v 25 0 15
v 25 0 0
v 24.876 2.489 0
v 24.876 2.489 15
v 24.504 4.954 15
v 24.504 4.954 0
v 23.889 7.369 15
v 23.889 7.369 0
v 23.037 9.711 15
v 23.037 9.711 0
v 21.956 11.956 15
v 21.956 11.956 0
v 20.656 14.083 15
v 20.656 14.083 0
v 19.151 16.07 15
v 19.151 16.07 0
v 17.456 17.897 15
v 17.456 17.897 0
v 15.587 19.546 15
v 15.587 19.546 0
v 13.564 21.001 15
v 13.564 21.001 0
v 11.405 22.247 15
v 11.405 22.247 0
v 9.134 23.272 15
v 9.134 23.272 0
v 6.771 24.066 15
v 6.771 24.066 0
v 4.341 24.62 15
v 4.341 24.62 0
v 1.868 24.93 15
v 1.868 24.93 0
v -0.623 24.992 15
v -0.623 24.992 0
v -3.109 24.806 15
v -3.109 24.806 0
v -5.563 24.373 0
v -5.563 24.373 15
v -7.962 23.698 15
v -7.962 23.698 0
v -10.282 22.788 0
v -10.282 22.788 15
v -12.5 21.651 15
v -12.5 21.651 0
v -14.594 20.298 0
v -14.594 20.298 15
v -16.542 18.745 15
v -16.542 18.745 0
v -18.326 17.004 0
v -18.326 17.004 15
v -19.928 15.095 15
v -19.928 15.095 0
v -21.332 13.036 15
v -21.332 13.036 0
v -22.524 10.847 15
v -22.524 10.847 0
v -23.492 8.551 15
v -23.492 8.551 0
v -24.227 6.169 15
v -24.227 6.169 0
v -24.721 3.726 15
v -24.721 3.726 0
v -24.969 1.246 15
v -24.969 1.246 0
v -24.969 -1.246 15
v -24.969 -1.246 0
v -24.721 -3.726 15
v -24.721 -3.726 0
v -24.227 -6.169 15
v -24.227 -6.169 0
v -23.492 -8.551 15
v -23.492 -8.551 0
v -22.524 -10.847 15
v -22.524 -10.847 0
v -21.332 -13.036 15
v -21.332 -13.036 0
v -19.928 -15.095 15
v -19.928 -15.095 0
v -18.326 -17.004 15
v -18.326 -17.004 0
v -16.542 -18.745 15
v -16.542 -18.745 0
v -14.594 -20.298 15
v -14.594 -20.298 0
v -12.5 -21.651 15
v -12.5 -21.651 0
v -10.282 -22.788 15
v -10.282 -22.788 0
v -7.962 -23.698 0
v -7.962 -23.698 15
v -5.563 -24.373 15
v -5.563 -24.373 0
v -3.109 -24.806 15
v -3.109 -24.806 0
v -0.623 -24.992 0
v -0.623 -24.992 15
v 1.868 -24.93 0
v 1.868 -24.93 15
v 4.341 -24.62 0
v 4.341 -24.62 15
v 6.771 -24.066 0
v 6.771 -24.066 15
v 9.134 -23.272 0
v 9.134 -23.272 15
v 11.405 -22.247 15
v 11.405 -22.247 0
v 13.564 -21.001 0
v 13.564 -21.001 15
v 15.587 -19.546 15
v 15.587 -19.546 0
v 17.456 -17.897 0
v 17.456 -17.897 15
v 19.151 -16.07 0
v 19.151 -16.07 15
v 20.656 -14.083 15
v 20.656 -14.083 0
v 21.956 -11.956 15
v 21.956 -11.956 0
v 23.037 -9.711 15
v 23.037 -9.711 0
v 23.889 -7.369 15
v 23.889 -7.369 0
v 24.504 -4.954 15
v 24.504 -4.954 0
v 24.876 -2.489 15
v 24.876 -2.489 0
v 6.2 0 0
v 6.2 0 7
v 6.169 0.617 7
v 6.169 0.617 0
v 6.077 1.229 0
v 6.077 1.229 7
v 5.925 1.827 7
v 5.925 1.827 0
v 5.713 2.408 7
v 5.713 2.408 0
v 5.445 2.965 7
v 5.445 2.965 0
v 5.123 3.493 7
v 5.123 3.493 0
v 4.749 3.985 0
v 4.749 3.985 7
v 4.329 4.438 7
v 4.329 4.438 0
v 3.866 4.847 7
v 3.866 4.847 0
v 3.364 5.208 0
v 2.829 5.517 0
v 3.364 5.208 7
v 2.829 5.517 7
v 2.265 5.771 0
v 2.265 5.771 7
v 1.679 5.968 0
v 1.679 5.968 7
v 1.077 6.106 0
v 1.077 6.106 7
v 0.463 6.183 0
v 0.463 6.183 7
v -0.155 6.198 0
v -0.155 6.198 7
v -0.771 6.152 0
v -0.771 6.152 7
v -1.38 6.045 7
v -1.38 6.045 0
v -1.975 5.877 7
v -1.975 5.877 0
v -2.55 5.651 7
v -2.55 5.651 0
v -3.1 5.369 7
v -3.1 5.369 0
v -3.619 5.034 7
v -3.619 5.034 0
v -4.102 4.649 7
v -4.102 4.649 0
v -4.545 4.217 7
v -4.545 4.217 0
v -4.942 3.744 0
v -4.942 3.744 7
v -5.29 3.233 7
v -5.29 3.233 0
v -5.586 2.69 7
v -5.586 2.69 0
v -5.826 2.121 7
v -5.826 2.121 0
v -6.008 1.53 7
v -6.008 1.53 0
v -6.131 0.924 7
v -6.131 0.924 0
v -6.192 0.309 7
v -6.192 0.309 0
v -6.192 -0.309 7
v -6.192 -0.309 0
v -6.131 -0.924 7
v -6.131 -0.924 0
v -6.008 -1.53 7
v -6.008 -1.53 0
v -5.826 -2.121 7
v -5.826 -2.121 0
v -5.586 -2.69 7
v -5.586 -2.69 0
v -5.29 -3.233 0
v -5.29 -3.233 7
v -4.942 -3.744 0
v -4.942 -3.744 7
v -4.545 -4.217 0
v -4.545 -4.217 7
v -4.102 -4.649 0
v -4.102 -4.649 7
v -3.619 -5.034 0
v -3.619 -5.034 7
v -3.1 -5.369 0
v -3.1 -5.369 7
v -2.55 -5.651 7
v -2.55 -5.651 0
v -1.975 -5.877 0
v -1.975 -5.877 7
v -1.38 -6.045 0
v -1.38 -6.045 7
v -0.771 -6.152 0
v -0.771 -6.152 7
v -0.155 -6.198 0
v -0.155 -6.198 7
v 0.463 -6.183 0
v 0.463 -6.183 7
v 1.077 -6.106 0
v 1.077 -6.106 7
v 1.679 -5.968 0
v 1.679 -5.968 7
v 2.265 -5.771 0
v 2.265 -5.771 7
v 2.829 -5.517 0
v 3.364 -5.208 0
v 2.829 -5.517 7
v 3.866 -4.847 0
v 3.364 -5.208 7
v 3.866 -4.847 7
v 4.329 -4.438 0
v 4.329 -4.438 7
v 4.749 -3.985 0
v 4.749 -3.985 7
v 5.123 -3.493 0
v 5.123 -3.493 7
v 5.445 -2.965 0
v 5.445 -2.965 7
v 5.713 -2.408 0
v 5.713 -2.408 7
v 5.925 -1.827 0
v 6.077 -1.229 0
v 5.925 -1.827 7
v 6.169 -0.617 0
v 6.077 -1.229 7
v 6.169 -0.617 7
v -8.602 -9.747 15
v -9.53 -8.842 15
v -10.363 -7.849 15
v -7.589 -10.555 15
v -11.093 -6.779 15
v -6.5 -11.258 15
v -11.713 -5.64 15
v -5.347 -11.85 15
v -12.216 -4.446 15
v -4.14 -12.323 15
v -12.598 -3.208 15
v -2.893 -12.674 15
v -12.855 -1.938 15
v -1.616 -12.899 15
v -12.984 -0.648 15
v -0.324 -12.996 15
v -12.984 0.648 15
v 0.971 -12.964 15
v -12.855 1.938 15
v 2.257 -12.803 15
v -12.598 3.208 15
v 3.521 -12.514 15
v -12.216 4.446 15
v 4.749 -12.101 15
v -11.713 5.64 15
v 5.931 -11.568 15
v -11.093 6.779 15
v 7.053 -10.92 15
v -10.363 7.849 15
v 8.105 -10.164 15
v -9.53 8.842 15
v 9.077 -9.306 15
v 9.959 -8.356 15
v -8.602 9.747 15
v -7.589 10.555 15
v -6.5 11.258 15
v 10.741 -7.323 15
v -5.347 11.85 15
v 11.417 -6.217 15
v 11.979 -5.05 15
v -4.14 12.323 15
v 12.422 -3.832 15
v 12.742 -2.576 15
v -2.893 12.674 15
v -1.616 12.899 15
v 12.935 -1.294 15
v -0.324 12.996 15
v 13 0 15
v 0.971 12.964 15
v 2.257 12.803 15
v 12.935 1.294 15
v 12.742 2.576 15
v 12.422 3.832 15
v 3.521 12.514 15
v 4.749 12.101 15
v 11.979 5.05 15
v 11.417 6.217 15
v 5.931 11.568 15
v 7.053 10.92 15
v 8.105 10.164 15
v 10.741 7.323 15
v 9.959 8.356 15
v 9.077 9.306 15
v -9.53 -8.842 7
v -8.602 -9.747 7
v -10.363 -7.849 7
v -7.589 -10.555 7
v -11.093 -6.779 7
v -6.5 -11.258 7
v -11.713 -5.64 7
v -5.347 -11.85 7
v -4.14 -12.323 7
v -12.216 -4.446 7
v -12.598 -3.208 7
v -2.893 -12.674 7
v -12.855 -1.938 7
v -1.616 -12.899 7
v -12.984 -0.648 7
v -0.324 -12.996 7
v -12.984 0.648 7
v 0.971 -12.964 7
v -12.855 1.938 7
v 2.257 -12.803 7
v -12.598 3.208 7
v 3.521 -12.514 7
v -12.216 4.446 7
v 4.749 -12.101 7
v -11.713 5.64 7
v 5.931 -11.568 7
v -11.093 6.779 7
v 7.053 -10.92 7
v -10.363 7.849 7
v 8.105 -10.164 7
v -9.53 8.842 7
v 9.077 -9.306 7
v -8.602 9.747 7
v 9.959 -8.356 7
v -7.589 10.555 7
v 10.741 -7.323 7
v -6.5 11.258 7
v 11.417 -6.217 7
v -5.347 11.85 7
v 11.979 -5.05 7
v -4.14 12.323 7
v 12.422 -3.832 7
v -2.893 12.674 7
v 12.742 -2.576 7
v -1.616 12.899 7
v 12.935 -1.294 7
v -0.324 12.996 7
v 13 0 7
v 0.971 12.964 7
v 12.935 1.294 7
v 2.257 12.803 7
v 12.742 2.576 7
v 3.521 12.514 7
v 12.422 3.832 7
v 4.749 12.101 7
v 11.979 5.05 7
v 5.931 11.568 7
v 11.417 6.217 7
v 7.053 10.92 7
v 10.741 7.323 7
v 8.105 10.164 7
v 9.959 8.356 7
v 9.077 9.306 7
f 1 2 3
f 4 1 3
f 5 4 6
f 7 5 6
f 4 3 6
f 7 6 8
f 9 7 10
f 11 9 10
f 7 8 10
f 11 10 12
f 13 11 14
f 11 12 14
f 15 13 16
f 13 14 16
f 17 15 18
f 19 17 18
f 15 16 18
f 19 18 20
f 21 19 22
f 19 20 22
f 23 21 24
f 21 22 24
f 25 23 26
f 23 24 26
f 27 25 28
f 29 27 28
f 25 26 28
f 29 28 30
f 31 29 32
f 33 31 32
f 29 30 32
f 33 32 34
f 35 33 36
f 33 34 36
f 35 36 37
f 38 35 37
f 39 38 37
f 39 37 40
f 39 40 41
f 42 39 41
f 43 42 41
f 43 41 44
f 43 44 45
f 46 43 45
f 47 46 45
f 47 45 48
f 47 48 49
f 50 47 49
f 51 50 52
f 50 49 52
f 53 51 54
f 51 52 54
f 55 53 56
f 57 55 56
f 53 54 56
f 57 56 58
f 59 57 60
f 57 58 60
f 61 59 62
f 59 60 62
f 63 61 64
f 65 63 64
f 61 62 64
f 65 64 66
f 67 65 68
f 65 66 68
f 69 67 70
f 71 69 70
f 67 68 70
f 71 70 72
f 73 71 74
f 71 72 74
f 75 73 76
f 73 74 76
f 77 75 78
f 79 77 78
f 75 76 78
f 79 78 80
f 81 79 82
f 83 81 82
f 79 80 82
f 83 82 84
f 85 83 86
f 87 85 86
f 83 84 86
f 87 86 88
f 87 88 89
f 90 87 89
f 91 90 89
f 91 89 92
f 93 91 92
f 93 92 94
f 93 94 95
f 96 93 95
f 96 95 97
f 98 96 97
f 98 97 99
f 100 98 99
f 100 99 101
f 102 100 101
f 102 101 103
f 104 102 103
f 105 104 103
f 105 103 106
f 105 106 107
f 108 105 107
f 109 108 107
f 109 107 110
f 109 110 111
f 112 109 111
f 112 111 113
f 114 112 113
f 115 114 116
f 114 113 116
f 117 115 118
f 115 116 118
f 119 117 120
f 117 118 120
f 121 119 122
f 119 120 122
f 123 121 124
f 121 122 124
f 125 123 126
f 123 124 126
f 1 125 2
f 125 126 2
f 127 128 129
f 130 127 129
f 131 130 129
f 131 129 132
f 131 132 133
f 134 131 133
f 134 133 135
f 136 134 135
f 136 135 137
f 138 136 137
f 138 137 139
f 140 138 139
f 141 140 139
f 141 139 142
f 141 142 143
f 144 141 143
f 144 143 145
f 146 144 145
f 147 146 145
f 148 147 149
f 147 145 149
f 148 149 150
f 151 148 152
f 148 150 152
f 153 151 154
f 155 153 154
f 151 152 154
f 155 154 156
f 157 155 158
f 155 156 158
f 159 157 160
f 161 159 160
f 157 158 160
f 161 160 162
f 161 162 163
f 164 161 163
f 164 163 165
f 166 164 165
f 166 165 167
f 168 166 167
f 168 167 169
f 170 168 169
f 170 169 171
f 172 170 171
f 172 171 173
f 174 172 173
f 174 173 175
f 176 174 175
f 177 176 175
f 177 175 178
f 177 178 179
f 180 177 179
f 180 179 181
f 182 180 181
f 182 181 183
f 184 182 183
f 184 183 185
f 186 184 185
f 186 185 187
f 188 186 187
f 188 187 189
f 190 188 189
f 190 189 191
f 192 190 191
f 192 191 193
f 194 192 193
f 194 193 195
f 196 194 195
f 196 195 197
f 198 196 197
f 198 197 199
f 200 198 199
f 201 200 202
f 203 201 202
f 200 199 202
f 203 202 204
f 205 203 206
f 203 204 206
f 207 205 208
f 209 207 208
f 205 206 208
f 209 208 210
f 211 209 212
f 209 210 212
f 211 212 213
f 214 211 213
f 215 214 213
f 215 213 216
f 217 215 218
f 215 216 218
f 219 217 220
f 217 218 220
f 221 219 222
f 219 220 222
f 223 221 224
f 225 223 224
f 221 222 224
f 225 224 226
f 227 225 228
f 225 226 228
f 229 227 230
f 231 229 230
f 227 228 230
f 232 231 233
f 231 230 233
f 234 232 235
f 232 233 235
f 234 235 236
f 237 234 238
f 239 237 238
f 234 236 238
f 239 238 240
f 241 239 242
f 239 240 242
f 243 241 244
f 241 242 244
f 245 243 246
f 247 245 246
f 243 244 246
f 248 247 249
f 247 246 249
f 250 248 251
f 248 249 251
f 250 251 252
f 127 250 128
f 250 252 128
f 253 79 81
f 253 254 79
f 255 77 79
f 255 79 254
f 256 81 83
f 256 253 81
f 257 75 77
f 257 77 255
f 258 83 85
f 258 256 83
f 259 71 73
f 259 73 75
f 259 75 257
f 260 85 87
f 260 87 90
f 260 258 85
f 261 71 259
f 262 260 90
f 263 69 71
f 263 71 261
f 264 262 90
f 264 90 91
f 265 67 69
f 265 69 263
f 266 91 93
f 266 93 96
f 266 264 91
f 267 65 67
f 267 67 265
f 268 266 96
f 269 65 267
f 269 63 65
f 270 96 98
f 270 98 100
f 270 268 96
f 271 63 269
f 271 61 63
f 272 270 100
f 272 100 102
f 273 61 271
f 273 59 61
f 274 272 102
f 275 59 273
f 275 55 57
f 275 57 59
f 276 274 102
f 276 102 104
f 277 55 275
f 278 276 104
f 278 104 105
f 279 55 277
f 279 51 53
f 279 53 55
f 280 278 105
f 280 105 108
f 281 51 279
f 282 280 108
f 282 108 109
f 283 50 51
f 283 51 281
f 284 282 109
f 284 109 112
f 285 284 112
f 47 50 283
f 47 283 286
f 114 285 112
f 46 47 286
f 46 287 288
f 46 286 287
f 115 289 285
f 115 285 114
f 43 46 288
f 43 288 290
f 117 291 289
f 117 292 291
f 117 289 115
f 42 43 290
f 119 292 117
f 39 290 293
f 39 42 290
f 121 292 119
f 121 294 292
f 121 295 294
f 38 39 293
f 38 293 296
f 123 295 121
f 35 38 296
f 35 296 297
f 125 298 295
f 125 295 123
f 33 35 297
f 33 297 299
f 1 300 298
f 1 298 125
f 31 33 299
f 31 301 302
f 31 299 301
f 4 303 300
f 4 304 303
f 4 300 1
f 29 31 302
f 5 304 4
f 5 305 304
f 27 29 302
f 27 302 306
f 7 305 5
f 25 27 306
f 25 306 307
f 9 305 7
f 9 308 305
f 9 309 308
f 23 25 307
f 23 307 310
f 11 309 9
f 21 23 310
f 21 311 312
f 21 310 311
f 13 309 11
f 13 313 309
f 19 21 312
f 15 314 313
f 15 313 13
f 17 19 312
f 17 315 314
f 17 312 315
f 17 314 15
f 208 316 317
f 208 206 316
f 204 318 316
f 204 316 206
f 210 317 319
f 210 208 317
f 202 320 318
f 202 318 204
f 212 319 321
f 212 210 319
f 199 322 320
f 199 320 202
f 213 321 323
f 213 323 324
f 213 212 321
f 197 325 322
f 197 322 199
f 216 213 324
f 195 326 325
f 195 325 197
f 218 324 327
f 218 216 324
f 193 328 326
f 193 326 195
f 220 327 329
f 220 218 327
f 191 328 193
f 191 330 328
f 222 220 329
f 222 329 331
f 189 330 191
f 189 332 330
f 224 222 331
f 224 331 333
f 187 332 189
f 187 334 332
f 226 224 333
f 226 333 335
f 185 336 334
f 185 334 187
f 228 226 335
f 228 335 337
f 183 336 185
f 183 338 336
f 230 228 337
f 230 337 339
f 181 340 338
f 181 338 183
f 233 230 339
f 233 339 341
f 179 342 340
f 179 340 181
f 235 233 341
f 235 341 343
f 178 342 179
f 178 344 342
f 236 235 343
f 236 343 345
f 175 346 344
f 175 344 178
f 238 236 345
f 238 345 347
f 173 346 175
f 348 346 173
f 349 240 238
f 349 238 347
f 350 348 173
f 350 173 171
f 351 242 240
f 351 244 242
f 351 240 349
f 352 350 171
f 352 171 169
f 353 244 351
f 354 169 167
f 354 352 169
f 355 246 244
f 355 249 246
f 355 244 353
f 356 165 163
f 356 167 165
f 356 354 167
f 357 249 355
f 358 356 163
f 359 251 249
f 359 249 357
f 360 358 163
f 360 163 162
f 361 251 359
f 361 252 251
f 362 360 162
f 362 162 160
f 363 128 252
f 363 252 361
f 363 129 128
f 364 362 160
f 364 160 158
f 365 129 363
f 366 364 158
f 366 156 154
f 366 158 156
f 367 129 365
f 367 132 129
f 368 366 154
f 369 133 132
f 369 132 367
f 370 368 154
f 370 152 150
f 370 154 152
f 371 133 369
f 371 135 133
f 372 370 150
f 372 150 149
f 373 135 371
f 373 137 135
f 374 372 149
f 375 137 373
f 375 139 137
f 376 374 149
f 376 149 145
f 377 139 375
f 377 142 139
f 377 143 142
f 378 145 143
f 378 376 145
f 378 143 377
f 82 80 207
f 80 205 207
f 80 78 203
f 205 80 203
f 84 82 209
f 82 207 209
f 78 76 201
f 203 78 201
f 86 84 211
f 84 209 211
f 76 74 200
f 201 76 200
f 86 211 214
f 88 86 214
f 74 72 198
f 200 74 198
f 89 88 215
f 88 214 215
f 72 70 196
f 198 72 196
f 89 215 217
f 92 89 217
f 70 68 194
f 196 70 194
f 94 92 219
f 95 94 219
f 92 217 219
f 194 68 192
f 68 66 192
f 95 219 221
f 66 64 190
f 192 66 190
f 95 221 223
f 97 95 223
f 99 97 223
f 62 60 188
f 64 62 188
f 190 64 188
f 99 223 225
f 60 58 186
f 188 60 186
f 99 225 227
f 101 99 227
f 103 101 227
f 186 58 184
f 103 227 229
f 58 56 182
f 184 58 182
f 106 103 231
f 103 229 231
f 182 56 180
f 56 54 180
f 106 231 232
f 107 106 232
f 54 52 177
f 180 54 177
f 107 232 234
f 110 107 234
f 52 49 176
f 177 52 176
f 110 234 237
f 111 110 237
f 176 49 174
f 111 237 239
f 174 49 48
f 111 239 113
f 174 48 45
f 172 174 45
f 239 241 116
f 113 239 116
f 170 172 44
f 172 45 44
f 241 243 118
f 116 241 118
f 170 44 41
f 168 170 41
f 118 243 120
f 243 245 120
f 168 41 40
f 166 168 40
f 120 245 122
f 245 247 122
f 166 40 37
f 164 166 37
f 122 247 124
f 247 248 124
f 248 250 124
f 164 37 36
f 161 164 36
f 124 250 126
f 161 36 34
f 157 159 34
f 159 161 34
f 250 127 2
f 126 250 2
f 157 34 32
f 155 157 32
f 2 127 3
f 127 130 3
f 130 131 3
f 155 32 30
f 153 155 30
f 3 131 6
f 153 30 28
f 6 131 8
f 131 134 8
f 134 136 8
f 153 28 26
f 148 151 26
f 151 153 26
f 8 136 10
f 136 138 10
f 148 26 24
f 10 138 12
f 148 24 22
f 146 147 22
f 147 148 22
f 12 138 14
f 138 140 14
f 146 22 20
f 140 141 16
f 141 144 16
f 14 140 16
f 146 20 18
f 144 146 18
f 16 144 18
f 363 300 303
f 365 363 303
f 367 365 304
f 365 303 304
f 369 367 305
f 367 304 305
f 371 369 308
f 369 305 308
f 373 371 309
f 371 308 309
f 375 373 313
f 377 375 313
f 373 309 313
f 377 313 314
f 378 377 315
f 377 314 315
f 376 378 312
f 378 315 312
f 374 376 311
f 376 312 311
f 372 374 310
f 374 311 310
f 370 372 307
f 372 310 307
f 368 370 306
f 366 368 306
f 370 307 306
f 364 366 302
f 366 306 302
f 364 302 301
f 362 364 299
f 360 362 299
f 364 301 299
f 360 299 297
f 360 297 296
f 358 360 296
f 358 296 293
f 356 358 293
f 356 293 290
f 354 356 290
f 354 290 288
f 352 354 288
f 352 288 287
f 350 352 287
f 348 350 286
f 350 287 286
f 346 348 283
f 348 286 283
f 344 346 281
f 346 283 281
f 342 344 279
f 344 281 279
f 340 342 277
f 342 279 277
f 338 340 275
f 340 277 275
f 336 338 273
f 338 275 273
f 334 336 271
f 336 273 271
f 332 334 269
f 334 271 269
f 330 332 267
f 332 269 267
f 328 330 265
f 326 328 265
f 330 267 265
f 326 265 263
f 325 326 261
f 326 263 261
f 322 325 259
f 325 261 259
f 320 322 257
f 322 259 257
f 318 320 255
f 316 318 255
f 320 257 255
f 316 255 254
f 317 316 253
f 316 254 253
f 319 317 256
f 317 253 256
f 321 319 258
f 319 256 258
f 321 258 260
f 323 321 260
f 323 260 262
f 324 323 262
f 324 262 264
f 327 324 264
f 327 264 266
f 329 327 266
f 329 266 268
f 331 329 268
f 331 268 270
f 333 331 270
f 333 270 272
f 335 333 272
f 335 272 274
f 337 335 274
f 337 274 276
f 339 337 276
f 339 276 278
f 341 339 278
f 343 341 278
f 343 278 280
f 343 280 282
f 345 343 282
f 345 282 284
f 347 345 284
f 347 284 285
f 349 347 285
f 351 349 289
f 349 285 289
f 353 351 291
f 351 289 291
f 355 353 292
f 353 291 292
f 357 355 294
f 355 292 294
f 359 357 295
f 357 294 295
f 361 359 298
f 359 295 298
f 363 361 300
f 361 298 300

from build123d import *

# Parameters (mm, degrees)
SKETCH_R        = 25
PAD_DEPTH       = 15
SKETCH001_R     = 6.2
POCKET_DEPTH    = 15
SKETCH002_R     = 13
POCKET001_DEPTH = 8


with BuildPart() as part:
    # Sketch → Pad (new body)
    with BuildSketch(Plane.XY):
        Circle(SKETCH_R)
    extrude(amount=PAD_DEPTH)

    # Sketch001 (on Face3 of Pad) → Pocket (cut)
    with BuildSketch(Plane.XY.offset(15)):
        Circle(SKETCH001_R)
    extrude(amount=-POCKET_DEPTH, mode=Mode.SUBTRACT)

    # Sketch002 (on Face3 of Pocket) → Pocket001 (cut)
    with BuildSketch(Plane.XY.offset(15)):
        Circle(SKETCH002_R)
    extrude(amount=-POCKET001_DEPTH, mode=Mode.SUBTRACT)


solid = part.part
